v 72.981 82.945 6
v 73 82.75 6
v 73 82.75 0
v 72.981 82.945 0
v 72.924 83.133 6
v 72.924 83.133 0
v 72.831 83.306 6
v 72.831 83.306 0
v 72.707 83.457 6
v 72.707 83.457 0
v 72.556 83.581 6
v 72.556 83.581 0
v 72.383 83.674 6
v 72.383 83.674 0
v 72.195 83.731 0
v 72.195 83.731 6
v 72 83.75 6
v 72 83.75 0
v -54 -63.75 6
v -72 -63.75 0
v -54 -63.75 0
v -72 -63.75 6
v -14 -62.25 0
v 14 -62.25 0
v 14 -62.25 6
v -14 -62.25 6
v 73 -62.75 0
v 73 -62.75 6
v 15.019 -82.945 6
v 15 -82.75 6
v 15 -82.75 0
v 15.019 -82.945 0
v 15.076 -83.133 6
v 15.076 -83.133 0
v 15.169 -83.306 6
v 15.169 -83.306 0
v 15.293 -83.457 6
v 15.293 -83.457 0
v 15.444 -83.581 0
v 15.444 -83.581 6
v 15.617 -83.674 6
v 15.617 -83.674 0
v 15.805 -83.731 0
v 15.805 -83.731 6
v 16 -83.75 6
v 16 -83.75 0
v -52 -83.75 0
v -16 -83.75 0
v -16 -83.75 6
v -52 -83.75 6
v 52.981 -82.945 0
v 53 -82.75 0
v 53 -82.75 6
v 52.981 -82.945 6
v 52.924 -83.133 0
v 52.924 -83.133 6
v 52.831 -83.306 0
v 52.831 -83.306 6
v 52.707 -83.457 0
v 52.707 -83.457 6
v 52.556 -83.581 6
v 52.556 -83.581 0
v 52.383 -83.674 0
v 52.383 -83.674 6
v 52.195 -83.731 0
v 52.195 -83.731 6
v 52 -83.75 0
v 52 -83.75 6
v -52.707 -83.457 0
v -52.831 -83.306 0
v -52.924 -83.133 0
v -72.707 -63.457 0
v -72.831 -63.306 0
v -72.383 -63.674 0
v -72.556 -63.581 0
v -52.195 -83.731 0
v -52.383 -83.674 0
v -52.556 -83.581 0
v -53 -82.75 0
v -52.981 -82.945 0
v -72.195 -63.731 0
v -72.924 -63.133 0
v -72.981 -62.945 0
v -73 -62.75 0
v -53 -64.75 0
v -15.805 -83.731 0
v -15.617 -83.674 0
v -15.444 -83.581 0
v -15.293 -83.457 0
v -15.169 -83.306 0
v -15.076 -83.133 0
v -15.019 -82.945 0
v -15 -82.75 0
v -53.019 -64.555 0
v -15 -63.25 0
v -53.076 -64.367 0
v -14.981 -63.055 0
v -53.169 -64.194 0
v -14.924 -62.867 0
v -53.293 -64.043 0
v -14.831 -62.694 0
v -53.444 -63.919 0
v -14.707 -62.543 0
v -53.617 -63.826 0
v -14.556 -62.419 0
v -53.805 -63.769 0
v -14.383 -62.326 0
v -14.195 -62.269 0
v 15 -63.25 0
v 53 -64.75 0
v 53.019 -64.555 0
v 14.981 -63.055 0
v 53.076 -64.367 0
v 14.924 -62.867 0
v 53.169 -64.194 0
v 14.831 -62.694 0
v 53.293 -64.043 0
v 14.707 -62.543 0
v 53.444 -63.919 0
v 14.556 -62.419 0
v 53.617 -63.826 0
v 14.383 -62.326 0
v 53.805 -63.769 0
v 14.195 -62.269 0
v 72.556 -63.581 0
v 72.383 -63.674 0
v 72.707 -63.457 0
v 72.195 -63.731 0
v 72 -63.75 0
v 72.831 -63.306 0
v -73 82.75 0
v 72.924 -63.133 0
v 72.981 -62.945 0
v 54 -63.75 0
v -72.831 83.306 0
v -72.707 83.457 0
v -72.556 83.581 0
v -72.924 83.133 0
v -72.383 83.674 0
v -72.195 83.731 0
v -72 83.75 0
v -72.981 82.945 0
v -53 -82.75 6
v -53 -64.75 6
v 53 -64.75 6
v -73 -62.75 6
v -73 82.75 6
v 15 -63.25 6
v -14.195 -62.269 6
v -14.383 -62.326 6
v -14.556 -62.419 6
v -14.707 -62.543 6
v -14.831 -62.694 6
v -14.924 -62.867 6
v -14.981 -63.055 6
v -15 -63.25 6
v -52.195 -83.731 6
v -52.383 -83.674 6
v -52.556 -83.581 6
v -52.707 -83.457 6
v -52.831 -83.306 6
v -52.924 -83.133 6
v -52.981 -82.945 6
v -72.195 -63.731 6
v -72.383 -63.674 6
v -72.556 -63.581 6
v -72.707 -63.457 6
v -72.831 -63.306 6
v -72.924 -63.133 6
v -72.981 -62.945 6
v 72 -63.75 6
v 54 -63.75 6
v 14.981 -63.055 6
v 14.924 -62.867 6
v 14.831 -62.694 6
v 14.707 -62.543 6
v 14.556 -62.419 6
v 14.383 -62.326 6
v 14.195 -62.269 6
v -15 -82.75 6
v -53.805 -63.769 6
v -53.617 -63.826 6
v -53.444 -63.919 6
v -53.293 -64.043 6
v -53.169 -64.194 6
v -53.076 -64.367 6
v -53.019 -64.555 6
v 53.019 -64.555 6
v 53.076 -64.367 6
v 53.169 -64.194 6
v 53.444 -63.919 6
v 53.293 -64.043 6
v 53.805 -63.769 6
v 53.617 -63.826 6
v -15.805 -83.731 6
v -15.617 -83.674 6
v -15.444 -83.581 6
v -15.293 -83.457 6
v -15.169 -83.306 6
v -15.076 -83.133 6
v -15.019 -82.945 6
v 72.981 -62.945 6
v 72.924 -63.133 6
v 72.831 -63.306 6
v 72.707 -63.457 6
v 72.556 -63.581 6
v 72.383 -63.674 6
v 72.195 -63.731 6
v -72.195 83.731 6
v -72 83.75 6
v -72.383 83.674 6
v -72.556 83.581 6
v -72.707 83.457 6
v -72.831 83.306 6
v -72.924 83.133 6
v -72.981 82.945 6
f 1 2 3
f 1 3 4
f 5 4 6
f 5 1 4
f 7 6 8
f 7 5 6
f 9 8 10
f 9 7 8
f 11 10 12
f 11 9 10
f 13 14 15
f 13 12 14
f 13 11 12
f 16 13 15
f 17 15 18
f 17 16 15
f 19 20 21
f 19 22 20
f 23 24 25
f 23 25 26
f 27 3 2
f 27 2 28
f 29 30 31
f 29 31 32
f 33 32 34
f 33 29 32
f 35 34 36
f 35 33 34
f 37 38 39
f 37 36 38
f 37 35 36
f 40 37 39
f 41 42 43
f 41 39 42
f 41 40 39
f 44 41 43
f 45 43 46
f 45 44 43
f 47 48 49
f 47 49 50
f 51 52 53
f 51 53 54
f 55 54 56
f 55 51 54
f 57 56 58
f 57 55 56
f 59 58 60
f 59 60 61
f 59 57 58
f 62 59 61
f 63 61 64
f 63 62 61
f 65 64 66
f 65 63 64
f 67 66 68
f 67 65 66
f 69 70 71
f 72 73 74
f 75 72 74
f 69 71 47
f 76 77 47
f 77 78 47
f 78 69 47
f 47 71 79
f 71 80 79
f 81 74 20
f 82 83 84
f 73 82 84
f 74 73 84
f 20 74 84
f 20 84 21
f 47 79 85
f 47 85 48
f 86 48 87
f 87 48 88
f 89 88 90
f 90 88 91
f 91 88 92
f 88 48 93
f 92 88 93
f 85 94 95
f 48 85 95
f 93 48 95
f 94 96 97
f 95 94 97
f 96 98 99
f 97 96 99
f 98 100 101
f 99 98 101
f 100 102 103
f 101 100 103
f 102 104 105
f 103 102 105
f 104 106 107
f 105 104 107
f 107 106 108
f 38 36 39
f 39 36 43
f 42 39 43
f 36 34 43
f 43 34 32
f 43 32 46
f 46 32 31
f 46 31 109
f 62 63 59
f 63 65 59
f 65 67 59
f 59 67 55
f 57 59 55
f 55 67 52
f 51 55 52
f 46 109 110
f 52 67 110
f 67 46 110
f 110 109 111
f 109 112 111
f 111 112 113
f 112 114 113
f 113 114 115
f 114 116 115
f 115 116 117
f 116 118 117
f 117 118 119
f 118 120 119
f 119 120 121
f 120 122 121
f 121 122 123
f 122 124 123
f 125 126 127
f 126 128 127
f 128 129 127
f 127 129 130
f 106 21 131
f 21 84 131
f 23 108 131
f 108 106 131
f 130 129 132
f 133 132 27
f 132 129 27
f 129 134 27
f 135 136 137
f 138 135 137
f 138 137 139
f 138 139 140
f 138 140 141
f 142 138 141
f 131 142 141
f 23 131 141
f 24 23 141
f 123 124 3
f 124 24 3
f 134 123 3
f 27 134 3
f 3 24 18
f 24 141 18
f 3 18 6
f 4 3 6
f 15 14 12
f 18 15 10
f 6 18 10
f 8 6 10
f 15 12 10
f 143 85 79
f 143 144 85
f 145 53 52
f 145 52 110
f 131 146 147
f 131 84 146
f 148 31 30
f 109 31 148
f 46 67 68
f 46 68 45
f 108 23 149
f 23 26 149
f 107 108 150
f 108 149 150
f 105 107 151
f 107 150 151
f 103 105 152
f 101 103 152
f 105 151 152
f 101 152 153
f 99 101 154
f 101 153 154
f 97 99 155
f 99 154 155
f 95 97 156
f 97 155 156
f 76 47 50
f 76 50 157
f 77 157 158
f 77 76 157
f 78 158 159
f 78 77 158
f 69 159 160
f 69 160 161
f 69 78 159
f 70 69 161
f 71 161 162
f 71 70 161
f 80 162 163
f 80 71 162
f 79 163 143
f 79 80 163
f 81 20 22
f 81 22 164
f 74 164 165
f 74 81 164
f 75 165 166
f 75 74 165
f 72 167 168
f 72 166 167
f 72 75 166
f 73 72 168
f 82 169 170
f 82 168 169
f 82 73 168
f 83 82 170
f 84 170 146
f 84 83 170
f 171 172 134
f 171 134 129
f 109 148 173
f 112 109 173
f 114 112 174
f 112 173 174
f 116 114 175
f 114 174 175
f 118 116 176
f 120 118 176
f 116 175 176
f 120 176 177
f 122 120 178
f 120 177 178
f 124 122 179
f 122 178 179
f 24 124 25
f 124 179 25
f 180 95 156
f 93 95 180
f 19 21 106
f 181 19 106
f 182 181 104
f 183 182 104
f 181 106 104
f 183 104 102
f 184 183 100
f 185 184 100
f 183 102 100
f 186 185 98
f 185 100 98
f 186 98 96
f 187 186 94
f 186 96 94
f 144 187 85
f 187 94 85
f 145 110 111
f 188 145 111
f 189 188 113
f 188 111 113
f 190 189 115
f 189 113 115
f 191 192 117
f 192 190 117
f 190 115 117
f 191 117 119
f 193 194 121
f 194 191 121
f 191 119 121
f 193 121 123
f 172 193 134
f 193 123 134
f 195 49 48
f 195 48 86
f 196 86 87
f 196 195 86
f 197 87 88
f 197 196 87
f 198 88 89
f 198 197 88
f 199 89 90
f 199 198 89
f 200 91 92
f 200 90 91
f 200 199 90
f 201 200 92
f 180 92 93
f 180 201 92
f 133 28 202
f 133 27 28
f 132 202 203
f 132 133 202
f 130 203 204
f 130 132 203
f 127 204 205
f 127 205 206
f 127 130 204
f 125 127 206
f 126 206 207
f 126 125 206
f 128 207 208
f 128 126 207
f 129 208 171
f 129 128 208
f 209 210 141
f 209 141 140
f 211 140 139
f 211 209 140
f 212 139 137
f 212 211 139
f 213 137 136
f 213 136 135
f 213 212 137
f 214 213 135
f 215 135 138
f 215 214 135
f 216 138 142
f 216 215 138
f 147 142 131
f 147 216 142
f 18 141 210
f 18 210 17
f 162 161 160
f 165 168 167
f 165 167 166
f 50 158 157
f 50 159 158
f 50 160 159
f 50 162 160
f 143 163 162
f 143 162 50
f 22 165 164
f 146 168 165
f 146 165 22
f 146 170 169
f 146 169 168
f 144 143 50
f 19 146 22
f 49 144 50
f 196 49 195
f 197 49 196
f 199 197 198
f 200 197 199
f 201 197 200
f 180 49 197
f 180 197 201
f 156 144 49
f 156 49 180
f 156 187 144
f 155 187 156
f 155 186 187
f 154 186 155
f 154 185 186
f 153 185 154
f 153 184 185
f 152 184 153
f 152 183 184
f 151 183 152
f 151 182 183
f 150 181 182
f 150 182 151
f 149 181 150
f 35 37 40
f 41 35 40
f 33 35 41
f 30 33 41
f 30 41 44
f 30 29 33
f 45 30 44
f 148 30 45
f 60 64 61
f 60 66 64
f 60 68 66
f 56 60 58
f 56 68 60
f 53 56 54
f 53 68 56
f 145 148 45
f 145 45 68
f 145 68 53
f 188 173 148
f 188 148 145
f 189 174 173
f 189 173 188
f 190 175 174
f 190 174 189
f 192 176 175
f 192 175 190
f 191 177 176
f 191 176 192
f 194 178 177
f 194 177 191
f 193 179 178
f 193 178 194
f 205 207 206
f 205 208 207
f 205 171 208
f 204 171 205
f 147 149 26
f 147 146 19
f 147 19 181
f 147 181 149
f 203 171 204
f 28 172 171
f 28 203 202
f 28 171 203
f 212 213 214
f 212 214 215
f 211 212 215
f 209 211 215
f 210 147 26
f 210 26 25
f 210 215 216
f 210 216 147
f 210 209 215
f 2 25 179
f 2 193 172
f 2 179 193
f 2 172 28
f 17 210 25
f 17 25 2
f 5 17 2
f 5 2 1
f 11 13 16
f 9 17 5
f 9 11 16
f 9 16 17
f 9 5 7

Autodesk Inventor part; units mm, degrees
sketch "Sketch1" plane through (0, 0, 0) normal (0, 0, 1) x (1, 0, 0)
  line L0 (-73, 83.75) -> (73, 83.75)
  line L1 (73, 83.75) -> (73, -83.75)
  line L2 (73, -83.75) -> (-73, -83.75)
  line L3 (-73, -83.75) -> (-73, 83.75)
  point P0 (0, 83.75)
  point P1 (0, 0)
  point P2 (-73, 0)
  dimension "d0" = 146
  dimension "d1" = 167.5
extrude "Extrusion1" add sketch "Sketch1" along normal blind 6
sketch "Sketch2" plane through (0, 0, 6) normal (0, 0, 1) x (1, 0, 0)
  line L0 (-73, 83.75) -> (-73, -83.75) projected
  line L1 (-73, -83.75) -> (-73, -63.75)
  line L2 (-67.5, -78.25) -> (-53, -78.25)
  line L3 (-53, -78.25) -> (-53, -83.75)
  line L4 (-73, -63.75) -> (-53, -63.75)
  line L5 (-53, -63.75) -> (-53, -83.75)
  line L6 (-73, -83.75) -> (73, -83.75) projected
  line L7 (-53, -83.75) -> (-73, -83.75)
  point P0 (0, 0)
  point P1 (40.5, -62.5)
  dimension "d14" = 20
  dimension "d18" = 20
extrude "Extrusion2" cut sketch "Sketch2" against normal blind 6
mirror "Mirror1" about plane through (0, 0, 0) normal (1, 0, 0) of "Extrusion2"
sketch "Sketch4" plane through (0, 0, 0) normal (0, 0, -1) x (-1, 0, 0)
  line L0 (-15, -62.25) -> (15, -62.25)
  line L1 (15, -62.25) -> (15, -83.75)
  line L2 (15, -83.75) -> (-15, -83.75)
  line L3 (-15, -83.75) -> (-15, -62.25)
  line L4 (53, -83.75) -> (-53, -83.75) projected
  point P0 (0, 0)
  point P1 (0, -83.75)
  point P2 (0, -83.75)
  point P3 (0, -83.75)
  dimension "d19" = 30
  dimension "d20" = 21.5
extrude "Extrusion4" cut sketch "Sketch4" against normal blind 6
fillet "Fillet1" radius 1 12 edges at (73, -63.75, 3) (53, -63.75, 3) (53, -83.75, 3) (15, -83.75, 3) (-15, -83.75, 3) (-15, -62.25, 3) (-53, -83.75, 3) (15, -62.25, 3) (-53, -63.75, 3) (-73, -63.75, 3) (-73, 83.75, 3) (73, 83.75, 3)
properties part number "MDF_Front_Side" material "MDF Medium Density Fiberboard"
